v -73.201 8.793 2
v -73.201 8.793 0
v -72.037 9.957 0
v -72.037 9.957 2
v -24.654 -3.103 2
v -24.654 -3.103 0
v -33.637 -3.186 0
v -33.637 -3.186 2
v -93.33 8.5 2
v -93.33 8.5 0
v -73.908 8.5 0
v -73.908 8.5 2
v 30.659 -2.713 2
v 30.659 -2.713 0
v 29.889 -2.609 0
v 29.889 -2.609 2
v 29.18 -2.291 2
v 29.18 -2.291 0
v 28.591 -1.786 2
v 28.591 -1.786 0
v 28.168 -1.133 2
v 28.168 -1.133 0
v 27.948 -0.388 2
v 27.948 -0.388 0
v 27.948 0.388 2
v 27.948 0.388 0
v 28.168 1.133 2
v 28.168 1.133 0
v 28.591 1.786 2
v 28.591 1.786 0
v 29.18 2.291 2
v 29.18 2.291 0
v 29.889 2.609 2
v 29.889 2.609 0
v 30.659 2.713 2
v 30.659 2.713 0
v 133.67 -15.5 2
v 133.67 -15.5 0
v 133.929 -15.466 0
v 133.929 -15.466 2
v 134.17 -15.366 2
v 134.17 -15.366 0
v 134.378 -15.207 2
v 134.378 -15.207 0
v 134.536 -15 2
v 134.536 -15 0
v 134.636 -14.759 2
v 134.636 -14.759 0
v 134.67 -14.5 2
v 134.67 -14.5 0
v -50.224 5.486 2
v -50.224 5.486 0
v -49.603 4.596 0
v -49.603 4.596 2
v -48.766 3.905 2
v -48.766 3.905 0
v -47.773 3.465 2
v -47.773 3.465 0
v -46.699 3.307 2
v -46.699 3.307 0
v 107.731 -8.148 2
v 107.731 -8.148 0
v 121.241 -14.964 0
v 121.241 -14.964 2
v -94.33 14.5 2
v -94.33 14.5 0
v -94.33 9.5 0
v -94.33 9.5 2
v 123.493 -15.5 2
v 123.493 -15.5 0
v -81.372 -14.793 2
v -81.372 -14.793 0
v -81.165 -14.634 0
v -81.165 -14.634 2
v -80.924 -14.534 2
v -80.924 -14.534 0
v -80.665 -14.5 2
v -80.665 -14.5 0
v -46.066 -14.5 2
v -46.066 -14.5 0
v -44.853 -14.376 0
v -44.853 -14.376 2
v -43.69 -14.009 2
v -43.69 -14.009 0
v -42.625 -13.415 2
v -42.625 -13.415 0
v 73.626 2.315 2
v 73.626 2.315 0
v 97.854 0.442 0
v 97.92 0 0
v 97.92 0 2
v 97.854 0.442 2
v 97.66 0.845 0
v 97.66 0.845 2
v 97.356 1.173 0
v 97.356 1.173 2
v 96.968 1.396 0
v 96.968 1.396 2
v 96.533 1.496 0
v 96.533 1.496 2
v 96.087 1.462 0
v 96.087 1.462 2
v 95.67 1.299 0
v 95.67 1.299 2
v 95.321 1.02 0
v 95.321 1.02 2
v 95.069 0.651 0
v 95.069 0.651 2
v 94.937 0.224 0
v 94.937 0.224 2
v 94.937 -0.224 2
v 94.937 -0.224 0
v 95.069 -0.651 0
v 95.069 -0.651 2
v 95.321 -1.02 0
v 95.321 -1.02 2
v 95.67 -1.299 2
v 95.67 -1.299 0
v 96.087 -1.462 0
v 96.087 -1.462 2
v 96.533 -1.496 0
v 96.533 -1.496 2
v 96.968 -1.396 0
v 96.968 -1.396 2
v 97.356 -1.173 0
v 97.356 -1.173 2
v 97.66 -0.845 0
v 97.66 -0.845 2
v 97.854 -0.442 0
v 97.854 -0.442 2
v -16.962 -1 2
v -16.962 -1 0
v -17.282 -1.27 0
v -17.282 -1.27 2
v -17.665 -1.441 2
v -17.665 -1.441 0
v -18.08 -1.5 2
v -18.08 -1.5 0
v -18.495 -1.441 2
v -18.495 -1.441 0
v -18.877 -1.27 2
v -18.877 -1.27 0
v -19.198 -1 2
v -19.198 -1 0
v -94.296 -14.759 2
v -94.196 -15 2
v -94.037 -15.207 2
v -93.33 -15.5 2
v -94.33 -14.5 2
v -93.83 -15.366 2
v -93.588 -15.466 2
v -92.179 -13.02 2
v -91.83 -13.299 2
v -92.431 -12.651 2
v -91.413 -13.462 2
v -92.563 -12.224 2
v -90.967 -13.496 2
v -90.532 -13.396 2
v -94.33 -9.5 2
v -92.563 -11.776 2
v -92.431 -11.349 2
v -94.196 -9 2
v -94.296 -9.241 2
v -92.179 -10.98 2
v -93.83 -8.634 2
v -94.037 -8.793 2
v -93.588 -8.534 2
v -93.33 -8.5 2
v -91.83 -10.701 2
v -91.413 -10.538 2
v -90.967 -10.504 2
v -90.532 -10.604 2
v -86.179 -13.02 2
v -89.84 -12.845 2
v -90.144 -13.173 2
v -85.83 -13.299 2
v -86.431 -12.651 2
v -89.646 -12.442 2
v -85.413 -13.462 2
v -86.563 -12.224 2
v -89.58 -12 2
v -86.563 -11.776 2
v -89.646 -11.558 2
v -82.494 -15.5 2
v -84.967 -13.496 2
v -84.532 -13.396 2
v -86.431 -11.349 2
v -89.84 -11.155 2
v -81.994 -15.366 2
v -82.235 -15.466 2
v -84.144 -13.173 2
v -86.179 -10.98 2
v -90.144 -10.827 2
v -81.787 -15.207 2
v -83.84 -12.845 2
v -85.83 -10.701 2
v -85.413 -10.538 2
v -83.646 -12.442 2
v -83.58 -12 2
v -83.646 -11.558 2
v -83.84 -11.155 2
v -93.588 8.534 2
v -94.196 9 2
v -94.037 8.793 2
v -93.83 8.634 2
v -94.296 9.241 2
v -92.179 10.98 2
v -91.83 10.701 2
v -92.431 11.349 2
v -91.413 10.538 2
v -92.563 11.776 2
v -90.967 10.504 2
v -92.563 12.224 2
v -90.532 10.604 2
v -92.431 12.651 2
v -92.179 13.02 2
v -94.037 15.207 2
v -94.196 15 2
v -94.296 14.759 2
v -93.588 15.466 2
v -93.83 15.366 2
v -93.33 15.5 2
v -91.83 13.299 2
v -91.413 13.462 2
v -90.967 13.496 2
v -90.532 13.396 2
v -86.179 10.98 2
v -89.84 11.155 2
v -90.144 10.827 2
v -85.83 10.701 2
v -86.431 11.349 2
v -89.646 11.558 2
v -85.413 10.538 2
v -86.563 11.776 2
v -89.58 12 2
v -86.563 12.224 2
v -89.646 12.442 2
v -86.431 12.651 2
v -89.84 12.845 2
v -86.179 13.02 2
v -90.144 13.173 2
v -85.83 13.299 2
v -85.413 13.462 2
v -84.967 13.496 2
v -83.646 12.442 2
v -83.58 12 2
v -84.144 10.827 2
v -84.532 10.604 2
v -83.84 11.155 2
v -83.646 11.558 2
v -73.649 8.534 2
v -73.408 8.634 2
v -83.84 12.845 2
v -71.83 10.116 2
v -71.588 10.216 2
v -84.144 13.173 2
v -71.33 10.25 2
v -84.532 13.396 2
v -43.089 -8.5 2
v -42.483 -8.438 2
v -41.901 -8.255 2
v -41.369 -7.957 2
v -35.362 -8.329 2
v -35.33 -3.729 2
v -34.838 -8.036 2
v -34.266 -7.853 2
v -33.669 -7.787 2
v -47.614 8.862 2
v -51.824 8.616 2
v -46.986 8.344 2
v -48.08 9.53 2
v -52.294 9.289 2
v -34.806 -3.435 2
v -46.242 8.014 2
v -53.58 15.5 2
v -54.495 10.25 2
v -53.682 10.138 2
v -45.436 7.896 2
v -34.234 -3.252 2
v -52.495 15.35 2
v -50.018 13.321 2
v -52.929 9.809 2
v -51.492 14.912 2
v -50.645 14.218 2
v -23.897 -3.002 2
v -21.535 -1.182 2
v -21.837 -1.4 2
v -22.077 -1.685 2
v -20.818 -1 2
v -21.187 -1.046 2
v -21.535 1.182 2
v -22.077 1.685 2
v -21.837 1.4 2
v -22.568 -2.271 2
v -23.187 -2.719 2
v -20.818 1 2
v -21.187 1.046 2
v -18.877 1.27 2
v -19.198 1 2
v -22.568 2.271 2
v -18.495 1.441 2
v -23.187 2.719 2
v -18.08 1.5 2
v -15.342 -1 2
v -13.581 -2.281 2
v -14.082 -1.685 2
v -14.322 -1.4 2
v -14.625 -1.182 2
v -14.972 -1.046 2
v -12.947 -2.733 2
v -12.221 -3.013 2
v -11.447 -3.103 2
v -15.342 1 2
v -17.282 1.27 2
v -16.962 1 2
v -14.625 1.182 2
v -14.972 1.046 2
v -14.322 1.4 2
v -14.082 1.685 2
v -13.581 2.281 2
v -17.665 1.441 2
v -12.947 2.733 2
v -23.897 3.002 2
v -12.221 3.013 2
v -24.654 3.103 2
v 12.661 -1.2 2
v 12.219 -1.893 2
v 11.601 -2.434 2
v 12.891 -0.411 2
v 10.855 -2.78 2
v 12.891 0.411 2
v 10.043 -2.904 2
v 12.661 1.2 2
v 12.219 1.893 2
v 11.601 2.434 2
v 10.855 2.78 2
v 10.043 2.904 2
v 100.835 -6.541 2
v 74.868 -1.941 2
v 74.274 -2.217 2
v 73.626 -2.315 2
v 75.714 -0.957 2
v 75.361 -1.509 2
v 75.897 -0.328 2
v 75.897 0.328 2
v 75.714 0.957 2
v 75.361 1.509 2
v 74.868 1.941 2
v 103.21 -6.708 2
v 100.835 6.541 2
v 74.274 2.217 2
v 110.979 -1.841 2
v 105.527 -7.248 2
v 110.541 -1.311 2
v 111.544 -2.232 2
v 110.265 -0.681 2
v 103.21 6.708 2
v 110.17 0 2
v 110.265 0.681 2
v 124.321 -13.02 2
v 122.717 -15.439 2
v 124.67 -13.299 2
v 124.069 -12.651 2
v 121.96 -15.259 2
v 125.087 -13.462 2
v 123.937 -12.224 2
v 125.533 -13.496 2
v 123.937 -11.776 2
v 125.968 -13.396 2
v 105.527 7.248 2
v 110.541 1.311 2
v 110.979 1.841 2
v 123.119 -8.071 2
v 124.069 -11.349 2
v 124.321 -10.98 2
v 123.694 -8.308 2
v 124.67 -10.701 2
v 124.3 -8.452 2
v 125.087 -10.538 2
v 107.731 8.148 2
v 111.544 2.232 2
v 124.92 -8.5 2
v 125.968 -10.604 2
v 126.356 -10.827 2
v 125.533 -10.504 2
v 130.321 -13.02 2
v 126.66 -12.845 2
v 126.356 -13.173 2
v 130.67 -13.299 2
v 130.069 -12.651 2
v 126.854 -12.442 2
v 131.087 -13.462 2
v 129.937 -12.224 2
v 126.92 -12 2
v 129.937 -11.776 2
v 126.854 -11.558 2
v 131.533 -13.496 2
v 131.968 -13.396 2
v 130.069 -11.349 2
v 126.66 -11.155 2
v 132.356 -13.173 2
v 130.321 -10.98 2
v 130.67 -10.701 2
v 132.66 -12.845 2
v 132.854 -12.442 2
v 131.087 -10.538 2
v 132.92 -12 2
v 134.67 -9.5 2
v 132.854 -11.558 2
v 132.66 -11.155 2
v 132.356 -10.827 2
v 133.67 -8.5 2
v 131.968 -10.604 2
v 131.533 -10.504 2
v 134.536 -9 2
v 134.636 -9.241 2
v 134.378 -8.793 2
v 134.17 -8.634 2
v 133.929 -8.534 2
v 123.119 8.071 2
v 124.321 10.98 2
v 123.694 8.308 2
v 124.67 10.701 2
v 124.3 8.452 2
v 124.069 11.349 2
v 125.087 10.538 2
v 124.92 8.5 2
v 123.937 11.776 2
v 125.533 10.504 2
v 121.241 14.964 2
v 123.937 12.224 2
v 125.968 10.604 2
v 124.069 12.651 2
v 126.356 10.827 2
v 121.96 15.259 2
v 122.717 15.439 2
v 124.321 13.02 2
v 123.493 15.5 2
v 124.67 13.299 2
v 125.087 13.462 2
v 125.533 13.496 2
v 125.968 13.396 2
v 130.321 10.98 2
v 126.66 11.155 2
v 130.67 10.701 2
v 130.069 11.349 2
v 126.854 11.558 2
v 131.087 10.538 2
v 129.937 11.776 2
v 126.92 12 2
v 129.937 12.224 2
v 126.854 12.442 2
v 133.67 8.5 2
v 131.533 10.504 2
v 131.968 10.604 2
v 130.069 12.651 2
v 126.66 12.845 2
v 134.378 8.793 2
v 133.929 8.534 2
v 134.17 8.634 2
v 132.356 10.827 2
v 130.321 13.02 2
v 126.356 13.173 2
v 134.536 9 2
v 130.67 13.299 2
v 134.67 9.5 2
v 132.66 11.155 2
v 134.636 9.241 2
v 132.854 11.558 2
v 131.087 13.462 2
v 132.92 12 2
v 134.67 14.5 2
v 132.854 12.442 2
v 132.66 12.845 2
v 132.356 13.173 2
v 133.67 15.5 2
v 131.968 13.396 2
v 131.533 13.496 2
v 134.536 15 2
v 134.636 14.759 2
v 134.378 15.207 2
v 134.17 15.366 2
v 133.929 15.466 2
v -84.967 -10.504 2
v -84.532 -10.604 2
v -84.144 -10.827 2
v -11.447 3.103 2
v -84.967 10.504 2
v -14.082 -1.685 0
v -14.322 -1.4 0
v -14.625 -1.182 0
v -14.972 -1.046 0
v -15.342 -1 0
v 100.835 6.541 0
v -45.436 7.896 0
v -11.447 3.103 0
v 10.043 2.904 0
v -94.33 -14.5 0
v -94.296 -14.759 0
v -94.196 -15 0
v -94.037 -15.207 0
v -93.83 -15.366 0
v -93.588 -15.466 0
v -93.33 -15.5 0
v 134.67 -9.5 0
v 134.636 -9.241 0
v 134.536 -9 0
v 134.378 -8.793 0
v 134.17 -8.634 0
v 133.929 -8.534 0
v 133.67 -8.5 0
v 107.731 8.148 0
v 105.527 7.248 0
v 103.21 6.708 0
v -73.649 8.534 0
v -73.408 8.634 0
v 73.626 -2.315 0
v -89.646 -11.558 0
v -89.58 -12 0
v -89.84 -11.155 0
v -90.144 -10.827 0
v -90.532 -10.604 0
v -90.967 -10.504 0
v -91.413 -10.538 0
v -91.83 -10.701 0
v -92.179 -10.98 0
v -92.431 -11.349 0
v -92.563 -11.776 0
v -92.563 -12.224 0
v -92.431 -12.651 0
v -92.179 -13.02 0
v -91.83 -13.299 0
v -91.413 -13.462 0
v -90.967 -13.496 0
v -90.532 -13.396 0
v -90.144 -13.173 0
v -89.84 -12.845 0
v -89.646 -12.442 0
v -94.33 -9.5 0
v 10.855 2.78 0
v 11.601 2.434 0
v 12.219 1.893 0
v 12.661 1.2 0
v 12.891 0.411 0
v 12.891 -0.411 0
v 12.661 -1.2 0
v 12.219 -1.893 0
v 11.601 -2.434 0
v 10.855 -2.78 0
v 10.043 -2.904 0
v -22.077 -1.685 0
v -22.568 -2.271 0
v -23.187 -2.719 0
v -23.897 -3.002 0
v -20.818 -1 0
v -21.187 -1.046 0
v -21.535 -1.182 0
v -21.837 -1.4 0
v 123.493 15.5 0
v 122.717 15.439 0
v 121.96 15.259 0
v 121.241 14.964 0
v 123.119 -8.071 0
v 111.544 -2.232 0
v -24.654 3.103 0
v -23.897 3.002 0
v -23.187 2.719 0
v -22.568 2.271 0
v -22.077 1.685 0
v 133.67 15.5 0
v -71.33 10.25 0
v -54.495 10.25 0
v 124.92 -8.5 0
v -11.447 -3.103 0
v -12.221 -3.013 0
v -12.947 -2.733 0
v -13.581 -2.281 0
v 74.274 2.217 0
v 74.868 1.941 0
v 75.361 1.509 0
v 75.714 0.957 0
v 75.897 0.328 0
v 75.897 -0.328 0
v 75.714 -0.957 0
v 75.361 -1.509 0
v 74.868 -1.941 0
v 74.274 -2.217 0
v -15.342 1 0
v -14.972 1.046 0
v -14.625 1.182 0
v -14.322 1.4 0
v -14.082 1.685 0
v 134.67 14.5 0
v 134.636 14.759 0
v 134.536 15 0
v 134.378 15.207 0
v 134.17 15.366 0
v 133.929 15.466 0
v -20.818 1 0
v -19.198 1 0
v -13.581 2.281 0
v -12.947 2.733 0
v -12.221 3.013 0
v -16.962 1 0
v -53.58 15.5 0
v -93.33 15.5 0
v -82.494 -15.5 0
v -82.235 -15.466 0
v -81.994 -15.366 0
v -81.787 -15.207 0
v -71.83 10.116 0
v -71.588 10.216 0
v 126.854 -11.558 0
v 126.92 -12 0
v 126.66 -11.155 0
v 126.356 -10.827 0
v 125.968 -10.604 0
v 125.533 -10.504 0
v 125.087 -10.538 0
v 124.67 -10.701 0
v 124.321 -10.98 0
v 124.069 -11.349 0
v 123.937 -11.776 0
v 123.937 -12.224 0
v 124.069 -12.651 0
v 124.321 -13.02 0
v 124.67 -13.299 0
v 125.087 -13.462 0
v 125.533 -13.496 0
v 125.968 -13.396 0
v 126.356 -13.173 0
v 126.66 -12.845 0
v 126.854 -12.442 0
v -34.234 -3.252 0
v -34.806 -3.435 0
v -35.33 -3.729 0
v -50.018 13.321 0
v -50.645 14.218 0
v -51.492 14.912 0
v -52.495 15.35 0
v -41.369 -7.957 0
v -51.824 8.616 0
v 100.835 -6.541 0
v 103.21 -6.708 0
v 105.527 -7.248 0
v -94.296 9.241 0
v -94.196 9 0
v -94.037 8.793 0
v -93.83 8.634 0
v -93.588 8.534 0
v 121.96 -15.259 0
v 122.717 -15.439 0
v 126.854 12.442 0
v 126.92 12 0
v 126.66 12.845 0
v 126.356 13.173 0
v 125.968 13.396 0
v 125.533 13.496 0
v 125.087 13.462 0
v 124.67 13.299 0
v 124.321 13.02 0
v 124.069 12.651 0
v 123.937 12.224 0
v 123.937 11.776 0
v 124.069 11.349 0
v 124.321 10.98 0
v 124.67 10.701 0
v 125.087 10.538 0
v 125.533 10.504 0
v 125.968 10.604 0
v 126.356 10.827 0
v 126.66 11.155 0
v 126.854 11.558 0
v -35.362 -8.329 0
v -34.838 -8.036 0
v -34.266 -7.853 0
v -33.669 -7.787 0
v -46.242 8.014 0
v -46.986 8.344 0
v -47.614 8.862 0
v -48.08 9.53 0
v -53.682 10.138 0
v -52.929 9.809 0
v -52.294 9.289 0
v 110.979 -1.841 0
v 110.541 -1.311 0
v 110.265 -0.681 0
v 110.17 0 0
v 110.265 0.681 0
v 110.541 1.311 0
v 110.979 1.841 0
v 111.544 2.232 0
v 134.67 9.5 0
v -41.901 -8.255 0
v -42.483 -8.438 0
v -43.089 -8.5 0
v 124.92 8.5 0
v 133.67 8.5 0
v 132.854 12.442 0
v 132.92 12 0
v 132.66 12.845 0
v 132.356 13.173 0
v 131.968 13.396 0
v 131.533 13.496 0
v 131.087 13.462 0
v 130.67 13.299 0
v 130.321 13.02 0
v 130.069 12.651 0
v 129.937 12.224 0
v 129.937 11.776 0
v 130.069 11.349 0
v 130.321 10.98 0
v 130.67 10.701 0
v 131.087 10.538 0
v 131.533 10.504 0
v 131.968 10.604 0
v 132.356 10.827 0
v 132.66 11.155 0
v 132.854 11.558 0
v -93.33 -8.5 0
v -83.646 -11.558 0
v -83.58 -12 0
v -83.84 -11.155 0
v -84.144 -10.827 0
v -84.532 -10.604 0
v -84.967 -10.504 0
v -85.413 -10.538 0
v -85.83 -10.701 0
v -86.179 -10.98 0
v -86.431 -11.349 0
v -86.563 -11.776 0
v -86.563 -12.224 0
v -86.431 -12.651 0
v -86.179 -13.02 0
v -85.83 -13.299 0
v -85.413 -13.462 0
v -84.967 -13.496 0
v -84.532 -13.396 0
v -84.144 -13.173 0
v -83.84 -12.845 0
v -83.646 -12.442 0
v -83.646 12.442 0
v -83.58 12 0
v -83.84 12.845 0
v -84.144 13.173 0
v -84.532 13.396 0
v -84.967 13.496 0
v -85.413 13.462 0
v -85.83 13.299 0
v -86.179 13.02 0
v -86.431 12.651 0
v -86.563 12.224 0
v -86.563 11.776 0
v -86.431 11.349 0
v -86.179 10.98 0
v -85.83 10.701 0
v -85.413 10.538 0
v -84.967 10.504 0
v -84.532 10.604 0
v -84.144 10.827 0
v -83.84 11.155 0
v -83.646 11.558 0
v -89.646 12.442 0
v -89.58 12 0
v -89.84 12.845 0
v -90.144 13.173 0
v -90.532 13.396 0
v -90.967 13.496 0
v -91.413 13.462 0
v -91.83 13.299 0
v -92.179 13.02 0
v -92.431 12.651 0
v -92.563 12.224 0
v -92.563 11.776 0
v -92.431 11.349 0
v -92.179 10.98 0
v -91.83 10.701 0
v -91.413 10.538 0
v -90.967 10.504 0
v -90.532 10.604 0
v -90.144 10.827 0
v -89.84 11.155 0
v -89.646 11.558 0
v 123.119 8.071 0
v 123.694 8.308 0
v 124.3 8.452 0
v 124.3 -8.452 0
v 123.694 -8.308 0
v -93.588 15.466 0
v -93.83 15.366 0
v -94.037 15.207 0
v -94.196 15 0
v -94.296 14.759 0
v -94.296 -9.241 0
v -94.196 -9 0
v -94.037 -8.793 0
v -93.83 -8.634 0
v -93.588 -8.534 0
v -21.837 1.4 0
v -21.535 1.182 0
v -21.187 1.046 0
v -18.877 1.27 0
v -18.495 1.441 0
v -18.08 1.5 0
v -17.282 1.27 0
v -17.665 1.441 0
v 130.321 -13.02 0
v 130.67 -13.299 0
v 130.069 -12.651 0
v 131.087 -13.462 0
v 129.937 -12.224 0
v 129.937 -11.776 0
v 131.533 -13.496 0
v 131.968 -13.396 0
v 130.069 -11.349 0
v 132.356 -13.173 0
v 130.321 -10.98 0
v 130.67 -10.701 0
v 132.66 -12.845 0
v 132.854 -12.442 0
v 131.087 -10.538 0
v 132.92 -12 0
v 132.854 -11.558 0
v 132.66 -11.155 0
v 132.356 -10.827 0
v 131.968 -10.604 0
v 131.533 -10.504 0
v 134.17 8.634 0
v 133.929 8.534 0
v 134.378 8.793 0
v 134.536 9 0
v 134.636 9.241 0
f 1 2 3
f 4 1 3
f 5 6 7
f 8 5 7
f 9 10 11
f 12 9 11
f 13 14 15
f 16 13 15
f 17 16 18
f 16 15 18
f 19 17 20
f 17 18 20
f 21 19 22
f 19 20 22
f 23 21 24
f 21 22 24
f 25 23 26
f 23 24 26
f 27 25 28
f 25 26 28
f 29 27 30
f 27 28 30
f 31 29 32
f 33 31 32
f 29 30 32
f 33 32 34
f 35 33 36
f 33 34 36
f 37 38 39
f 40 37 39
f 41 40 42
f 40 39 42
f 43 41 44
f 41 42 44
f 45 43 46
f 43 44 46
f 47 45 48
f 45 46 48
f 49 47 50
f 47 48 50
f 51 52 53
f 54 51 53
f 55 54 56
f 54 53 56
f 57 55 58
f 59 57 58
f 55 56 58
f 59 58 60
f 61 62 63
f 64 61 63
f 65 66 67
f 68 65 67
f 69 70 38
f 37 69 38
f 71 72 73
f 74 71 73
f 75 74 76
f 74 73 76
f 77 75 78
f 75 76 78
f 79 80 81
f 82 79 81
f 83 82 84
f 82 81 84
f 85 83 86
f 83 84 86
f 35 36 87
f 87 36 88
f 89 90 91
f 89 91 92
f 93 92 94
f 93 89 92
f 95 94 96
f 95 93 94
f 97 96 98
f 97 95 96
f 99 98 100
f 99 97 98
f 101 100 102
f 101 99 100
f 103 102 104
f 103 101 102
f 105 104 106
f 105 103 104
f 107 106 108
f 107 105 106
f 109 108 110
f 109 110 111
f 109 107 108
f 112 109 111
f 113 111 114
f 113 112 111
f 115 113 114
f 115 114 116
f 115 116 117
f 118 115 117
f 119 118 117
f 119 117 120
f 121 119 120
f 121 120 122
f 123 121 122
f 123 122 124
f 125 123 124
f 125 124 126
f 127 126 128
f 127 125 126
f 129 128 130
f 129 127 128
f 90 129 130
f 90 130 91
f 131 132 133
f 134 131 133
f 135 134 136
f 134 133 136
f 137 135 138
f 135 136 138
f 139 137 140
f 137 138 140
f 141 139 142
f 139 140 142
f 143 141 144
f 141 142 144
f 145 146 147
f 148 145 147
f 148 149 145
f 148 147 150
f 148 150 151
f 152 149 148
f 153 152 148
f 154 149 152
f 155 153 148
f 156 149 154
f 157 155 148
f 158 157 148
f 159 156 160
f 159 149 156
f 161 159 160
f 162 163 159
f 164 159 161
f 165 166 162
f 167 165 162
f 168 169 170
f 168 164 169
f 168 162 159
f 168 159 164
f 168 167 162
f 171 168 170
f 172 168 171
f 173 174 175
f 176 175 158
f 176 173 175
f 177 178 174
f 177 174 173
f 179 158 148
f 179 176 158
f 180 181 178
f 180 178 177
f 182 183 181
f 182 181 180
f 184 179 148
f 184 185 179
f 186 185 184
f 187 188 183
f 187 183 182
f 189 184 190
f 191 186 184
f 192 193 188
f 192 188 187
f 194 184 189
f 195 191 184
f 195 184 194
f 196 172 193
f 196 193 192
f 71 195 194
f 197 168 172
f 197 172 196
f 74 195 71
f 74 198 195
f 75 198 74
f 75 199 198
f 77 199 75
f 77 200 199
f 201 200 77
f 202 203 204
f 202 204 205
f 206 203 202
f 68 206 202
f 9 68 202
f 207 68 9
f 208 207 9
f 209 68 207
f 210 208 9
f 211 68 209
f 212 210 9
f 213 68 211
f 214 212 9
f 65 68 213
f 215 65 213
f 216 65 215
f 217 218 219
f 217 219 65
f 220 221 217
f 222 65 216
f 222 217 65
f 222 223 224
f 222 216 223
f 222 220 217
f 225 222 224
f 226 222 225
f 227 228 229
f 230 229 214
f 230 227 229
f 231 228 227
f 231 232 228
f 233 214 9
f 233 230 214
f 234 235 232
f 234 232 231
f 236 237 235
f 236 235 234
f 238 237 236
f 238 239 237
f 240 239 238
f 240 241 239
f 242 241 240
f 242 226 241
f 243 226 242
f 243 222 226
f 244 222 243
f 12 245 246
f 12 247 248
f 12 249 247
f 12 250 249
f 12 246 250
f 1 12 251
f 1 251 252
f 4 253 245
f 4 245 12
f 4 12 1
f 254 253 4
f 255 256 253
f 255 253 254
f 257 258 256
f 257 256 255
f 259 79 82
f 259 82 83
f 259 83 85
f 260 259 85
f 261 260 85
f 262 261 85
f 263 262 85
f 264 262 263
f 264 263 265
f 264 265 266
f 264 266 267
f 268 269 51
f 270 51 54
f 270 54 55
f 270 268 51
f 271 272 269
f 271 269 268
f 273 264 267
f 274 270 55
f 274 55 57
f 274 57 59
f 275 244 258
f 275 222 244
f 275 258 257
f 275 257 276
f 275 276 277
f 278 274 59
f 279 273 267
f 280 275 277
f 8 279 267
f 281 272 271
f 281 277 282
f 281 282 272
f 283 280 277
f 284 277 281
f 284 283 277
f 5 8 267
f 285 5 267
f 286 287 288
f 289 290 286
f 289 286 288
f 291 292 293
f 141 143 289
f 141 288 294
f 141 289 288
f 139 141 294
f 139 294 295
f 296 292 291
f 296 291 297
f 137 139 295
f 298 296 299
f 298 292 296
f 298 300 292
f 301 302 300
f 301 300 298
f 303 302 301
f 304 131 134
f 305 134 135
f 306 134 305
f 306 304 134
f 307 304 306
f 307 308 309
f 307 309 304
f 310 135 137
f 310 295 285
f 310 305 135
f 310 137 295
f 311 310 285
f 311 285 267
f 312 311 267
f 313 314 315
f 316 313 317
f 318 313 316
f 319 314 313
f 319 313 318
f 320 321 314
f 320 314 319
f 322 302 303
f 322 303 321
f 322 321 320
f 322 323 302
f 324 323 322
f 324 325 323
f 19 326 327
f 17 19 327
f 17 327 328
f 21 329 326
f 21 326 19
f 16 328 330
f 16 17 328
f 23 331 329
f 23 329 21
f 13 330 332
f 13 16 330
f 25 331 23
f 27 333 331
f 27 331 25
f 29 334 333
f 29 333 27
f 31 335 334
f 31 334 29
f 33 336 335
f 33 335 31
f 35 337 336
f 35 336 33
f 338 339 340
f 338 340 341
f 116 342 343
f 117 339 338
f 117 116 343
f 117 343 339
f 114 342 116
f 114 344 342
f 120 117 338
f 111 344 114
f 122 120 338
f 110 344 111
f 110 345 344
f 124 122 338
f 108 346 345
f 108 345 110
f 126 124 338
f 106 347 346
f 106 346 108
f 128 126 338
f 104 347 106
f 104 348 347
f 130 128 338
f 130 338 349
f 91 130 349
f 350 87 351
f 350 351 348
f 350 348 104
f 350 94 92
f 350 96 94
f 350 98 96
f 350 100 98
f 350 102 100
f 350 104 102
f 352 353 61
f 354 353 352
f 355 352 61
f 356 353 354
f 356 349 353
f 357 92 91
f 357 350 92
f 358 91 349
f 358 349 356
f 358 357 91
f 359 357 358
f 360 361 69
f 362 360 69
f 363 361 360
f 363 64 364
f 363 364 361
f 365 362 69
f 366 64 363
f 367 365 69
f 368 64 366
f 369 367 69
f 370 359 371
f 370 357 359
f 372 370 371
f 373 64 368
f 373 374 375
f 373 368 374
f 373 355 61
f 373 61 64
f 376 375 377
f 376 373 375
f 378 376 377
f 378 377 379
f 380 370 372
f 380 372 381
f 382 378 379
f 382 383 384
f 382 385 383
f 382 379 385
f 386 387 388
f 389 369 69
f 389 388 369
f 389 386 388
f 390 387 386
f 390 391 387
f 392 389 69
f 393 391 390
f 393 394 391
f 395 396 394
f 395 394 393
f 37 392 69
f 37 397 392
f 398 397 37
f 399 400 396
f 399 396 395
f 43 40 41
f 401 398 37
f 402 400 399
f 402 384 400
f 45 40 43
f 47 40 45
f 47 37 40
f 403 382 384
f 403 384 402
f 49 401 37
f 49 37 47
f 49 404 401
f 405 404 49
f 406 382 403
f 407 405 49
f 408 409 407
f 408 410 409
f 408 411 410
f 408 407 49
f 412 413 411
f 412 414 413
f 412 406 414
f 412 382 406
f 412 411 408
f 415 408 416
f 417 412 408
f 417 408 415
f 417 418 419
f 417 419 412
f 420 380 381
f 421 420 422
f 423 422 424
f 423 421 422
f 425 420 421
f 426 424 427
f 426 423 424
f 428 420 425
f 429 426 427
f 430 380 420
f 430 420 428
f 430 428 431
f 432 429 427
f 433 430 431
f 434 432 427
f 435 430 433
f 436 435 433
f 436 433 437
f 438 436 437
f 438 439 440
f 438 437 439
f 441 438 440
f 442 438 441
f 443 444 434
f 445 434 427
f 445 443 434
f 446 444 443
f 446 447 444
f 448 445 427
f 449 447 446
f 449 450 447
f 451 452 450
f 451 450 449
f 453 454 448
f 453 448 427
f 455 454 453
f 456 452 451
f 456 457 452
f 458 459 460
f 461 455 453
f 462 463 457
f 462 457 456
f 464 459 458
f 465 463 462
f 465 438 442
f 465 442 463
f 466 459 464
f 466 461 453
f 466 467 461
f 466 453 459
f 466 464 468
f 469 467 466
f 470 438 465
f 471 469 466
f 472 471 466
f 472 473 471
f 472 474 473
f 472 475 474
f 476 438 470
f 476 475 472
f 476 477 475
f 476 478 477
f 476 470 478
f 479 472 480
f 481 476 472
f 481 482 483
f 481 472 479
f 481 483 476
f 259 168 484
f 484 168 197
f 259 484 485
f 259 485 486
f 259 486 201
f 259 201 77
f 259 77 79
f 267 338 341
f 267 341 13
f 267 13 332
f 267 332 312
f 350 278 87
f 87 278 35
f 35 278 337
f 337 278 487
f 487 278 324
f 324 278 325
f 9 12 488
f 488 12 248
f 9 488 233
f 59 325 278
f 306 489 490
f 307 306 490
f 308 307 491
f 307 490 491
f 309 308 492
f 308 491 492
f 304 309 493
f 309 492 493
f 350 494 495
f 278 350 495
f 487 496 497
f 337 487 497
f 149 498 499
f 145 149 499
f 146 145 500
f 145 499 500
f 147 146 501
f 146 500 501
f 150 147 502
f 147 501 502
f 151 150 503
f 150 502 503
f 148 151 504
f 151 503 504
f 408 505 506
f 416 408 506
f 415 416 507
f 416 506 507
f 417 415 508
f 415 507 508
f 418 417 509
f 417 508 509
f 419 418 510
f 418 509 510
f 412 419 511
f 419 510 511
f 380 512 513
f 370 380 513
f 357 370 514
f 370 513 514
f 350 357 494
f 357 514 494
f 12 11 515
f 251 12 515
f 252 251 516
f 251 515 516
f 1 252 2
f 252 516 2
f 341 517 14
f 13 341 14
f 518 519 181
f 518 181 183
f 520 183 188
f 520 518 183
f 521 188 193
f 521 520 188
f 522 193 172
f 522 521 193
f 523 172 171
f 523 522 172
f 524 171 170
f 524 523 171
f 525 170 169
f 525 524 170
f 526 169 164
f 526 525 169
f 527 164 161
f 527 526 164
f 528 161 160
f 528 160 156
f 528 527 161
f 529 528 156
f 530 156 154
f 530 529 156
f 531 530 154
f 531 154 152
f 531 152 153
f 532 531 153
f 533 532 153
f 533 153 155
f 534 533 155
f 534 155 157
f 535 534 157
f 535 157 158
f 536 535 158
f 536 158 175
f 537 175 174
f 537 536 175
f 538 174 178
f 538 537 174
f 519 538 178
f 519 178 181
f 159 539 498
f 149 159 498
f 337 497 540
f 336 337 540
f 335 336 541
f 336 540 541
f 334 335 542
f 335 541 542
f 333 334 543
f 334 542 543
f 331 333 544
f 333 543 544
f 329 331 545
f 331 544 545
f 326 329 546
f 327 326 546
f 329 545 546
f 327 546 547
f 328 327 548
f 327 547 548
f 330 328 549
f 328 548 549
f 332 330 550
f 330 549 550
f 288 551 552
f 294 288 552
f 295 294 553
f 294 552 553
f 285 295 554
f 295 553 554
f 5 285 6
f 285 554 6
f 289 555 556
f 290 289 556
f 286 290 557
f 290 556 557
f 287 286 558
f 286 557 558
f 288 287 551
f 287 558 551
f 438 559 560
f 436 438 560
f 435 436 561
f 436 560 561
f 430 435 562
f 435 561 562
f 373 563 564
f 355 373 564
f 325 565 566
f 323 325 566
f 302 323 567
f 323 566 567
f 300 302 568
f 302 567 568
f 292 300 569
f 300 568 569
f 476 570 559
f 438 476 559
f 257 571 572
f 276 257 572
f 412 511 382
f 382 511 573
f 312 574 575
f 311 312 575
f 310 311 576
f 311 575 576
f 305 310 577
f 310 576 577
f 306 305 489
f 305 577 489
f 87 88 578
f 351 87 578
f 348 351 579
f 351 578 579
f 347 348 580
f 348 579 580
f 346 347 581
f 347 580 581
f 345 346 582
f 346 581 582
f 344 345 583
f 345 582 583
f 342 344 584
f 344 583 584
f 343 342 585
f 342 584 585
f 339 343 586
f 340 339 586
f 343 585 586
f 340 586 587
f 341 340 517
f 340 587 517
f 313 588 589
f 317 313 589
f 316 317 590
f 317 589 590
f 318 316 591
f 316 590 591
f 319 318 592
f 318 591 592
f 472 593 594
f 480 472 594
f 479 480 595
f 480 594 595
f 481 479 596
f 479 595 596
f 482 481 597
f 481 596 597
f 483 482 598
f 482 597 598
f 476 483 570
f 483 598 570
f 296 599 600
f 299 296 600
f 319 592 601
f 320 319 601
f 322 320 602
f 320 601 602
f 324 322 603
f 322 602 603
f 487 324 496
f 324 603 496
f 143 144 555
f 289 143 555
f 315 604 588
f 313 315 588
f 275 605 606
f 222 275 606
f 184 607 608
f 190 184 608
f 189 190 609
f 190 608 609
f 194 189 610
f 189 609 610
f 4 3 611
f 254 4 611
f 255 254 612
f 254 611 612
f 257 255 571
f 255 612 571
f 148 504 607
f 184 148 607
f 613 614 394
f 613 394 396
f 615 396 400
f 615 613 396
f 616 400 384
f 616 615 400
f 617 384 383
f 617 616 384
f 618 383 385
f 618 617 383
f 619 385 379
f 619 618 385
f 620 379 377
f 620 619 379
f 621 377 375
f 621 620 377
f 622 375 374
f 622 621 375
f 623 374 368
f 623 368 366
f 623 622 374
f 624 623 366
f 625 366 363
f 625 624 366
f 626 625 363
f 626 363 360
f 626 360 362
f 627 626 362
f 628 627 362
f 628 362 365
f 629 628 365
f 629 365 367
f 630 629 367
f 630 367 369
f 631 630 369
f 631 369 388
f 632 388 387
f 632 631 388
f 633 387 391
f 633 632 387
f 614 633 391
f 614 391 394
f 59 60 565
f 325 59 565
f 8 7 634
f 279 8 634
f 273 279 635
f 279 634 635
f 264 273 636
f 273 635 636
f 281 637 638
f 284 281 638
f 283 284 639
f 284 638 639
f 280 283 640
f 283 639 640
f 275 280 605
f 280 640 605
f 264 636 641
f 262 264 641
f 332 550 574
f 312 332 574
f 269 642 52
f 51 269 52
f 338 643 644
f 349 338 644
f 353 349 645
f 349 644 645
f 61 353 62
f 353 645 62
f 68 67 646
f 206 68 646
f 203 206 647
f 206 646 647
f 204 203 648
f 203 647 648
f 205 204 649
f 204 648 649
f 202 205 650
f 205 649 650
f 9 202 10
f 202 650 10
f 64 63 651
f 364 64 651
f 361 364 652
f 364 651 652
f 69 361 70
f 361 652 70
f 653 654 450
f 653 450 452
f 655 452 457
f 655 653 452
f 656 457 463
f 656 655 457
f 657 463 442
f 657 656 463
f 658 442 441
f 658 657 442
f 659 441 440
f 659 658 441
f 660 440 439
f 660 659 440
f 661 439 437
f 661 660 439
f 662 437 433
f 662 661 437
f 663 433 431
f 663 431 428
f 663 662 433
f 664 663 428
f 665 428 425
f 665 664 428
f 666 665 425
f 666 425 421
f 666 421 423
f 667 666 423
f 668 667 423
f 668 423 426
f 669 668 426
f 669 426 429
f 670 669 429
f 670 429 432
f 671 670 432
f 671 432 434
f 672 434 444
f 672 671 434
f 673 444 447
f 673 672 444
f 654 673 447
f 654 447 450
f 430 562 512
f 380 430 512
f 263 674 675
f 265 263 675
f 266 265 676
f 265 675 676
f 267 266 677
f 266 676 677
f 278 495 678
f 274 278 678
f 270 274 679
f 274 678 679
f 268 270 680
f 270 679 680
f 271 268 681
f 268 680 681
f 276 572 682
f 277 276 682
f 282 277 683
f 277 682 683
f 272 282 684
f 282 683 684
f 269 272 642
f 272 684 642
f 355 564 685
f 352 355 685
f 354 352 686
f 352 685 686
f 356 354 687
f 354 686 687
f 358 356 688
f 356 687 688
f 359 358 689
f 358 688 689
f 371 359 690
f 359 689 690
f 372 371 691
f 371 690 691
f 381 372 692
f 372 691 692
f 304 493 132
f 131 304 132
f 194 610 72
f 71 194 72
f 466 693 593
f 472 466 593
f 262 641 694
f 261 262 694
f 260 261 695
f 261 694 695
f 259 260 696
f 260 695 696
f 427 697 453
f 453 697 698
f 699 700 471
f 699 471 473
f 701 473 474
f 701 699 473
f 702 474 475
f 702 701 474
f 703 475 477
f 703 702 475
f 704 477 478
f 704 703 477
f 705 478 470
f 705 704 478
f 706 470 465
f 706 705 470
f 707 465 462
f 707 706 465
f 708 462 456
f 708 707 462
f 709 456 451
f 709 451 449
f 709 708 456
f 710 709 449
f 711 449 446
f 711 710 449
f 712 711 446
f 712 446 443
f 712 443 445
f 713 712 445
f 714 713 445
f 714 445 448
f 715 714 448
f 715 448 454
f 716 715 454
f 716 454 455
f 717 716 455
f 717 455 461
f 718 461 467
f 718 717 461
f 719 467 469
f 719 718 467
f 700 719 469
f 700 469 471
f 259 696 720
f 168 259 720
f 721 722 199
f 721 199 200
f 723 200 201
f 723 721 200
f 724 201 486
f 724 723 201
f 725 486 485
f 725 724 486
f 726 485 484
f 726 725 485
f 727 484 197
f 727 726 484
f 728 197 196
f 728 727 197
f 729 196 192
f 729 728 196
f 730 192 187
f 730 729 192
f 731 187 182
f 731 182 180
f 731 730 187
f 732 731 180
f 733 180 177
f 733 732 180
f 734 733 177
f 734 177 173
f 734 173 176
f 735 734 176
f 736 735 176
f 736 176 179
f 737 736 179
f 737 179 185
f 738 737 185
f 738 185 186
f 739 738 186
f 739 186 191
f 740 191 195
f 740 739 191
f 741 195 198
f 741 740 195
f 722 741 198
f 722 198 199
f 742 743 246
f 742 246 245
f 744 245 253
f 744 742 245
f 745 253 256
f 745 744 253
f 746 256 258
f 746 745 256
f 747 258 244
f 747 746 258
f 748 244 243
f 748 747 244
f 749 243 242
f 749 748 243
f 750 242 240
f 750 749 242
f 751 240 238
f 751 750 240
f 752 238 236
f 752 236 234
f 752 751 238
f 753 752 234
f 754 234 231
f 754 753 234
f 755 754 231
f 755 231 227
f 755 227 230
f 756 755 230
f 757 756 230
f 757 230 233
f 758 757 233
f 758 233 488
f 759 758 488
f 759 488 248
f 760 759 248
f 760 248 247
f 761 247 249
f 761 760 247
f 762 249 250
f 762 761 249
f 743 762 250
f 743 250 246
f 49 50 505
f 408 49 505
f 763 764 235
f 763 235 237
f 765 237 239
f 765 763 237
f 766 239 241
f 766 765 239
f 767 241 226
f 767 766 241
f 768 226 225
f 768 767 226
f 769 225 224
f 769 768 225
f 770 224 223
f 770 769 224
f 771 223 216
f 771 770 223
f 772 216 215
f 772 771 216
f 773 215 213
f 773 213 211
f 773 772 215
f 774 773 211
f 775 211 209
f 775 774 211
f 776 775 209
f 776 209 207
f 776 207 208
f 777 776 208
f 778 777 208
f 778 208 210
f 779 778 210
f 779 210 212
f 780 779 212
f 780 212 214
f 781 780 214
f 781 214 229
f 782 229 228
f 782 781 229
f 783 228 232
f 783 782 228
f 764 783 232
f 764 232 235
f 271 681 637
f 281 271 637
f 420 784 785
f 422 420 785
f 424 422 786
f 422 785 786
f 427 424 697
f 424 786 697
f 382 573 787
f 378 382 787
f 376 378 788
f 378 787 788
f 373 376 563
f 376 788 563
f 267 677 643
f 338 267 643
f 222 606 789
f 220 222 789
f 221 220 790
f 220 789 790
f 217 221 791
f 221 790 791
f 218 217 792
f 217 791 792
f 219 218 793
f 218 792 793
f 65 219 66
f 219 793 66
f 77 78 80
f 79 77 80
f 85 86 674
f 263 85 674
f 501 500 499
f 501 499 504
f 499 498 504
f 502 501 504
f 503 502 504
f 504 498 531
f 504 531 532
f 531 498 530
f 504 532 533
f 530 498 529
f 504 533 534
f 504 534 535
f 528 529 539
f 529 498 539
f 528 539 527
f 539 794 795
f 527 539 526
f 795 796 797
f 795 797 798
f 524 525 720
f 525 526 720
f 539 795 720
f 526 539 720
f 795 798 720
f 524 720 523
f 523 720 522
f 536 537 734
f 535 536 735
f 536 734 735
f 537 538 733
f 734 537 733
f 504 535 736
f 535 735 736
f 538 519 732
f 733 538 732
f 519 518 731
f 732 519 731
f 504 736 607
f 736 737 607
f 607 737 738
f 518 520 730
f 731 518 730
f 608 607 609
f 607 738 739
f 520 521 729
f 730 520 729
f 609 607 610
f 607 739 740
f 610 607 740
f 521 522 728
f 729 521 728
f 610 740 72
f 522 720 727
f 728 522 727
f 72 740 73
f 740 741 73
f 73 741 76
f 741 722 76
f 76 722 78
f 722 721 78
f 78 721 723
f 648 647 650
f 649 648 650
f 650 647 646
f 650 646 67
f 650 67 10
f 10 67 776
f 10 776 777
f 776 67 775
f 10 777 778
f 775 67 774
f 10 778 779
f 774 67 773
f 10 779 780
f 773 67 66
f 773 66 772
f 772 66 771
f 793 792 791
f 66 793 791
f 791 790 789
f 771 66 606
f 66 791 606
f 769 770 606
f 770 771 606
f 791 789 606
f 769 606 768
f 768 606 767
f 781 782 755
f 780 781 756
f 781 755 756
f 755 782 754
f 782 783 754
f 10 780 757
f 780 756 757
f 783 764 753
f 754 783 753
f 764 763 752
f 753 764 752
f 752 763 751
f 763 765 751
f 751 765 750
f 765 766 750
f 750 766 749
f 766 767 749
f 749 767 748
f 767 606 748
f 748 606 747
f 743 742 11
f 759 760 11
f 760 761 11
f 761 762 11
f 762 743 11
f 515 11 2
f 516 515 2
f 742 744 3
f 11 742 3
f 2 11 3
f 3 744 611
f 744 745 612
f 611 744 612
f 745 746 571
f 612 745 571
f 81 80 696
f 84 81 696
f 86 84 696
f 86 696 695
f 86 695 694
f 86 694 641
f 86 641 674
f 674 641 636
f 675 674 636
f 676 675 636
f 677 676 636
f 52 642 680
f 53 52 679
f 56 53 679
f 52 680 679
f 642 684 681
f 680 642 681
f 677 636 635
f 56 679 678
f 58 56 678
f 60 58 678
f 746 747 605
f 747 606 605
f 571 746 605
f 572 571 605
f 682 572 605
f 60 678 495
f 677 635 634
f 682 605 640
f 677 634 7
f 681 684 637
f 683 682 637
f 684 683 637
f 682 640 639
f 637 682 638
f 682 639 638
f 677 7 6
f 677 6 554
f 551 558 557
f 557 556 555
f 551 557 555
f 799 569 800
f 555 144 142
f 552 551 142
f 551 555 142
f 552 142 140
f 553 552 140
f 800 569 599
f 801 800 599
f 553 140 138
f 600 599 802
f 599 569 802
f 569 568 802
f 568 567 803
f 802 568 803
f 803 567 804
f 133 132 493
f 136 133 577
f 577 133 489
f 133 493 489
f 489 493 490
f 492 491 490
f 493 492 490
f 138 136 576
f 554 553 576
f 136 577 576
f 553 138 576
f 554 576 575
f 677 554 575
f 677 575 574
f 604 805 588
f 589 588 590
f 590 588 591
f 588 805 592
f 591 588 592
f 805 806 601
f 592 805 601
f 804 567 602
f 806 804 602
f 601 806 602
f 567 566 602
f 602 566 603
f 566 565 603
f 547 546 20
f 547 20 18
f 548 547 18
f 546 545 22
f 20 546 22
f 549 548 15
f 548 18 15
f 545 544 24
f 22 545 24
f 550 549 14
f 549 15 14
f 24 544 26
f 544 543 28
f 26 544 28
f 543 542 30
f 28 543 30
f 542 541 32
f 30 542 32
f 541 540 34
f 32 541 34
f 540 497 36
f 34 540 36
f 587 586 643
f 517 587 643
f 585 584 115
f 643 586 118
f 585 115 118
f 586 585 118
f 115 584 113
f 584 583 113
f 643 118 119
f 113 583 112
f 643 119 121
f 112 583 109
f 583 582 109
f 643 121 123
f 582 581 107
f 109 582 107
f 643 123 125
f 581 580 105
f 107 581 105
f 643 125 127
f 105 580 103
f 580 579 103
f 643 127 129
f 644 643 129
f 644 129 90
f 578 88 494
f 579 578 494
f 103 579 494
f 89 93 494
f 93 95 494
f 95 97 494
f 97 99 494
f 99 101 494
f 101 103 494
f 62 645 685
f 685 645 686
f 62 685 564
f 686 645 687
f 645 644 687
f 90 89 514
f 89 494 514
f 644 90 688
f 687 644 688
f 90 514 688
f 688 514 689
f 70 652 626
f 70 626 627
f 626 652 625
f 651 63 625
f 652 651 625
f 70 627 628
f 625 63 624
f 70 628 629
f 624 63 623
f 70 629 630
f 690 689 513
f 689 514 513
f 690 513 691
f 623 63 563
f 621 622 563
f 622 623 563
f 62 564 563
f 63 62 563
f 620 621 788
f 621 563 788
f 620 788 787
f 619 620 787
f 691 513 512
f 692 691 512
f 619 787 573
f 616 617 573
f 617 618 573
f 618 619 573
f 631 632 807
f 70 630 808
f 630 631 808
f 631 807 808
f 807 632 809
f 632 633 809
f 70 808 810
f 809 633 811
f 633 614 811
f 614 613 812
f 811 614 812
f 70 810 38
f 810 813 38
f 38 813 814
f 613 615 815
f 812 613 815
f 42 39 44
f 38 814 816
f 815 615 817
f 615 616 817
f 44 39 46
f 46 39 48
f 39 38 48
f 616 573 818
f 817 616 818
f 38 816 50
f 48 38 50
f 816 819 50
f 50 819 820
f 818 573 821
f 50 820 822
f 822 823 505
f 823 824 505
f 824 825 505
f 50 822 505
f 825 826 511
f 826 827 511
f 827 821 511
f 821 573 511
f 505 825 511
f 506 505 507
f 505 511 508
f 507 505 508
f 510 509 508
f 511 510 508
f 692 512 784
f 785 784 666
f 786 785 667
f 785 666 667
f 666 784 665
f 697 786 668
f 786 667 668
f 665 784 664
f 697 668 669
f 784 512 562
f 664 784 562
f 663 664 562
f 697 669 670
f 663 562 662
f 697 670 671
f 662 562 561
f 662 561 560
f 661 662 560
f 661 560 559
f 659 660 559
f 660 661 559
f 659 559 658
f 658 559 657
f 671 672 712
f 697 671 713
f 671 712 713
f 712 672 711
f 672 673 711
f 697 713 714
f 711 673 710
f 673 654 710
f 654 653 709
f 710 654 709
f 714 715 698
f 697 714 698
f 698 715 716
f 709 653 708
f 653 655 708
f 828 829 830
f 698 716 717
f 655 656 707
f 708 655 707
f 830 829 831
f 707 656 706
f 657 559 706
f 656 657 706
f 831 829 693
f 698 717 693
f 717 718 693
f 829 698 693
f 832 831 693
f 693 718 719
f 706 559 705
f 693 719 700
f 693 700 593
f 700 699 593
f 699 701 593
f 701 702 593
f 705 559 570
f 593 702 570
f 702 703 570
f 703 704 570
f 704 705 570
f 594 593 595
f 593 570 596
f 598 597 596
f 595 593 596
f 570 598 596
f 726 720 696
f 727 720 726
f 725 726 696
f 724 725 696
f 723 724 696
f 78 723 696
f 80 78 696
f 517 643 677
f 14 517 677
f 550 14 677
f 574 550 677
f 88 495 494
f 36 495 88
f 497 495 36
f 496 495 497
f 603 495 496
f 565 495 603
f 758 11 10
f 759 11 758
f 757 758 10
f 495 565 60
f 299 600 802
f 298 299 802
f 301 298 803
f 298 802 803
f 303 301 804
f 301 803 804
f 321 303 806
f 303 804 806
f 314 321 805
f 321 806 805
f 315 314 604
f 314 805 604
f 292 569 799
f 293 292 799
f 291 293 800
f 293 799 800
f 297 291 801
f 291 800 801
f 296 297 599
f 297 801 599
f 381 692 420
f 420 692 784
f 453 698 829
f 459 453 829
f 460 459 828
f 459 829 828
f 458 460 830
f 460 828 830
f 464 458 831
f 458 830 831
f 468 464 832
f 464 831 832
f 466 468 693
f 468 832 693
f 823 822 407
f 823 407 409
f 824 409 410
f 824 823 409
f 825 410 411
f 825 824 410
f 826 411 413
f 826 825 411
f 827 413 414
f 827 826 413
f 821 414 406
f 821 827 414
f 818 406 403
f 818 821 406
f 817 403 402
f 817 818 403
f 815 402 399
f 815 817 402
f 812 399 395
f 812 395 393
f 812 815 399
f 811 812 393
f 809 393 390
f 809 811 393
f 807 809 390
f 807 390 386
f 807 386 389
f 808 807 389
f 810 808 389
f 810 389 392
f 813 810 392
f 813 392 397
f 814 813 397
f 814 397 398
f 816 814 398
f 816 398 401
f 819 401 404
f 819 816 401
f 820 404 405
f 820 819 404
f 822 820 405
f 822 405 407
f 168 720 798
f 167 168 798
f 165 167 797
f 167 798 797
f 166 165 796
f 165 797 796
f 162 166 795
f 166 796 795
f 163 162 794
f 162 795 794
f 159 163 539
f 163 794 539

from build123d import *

# Parameters (mm, degrees)
F0_R     = 1.5
F1_DEPTH = 2


with BuildPart() as f1:
    # F0 (on Top) → F1 (new body)
    with BuildSketch(Plane.XY):
        with BuildLine():
            ThreePointArc((-19.197627, 1), (-18.079593, 1.5), (-16.961559, 1))
            Line((-16.961559, 1), (-15.341597, 1))
            ThreePointArc((-15.341597, 1), (-14.624629, 1.182443), (-14.082068, 1.685392))
            ThreePointArc((-14.082068, 1.685392), (-12.946894, 2.732812), (-11.447412, 3.103307))
            Line((-11.447412, 3.103307), (10.042908, 2.904272))
            ThreePointArc((10.042908, 2.904272), (12.920407, 0), (10.042908, -2.904272))
            Line((10.042908, -2.904272), (-11.447412, -3.103307))
            ThreePointArc((-11.447412, -3.103307), (-12.946894, -2.732812), (-14.082068, -1.685392))
            ThreePointArc((-14.082068, -1.685392), (-14.624629, -1.182443), (-15.341597, -1))
            Line((-15.341597, -1), (-16.961559, -1))
            ThreePointArc((-16.961559, -1), (-18.079593, -1.5), (-19.197627, -1))
            Line((-19.197627, -1), (-20.817589, -1))
            ThreePointArc((-20.817589, -1), (-21.534557, -1.182443), (-22.077118, -1.685392))
            ThreePointArc((-22.077118, -1.685392), (-23.187047, -2.719074), (-24.654291, -3.103307))
            Line((-24.654291, -3.103307), (-33.636647, -3.186497))
            ThreePointArc((-33.636647, -3.186497), (-34.524221, -3.329426), (-35.329593, -3.728912))
            Line((-35.329593, -3.728912), (-41.368579, -7.957456))
            ThreePointArc((-41.368579, -7.957456), (-42.187191, -8.361151), (-43.089309, -8.5))
            Line((-43.089309, -8.5), (-93.329593, -8.5))
            ThreePointArc((-93.329593, -8.5), (-94.0367, -8.792893), (-94.329593, -9.5))
            Line((-94.329593, -9.5), (-94.329593, -14.5))
            ThreePointArc((-94.329593, -14.5), (-94.0367, -15.207107), (-93.329593, -15.5))
            Line((-93.329593, -15.5), (-82.493807, -15.5))
            ThreePointArc((-82.493807, -15.5), (-82.111123, -15.42388), (-81.7867, -15.207107))
            Line((-81.7867, -15.207107), (-81.372486, -14.792893))
            ThreePointArc((-81.372486, -14.792893), (-81.048063, -14.57612), (-80.66538, -14.5))
            Line((-80.66538, -14.5), (-46.066168, -14.5))
            ThreePointArc((-46.066168, -14.5), (-44.261933, -14.222302), (-42.624709, -13.414912))
            Line((-42.624709, -13.414912), (-35.361857, -8.329409))
            ThreePointArc((-35.361857, -8.329409), (-34.556484, -7.929922), (-33.668911, -7.786993))
            Line((-33.668911, -7.786993), (100.835377, -6.541272))
            ThreePointArc((100.835377, -6.541272), (104.379181, -6.932181), (107.730626, -8.148393))
            Line((107.730626, -8.148393), (121.240512, -14.964079))
            ThreePointArc((121.240512, -14.964079), (122.335124, -15.364175), (123.492622, -15.5))
            Line((123.492622, -15.5), (133.670407, -15.5))
            ThreePointArc((133.670407, -15.5), (134.377514, -15.207107), (134.670407, -14.5))
            Line((134.670407, -14.5), (134.670407, -9.5))
            ThreePointArc((134.670407, -9.5), (134.377514, -8.792893), (133.670407, -8.5))
            Line((133.670407, -8.5), (124.920407, -8.5))
            ThreePointArc((124.920407, -8.5), (123.994408, -8.39134), (123.118718, -8.071263))
            Line((123.118718, -8.071263), (111.544352, -2.232039))
            ThreePointArc((111.544352, -2.232039), (110.170407, 0), (111.544352, 2.232039))
            Line((111.544352, 2.232039), (123.118718, 8.071263))
            ThreePointArc((123.118718, 8.071263), (123.994408, 8.39134), (124.920407, 8.5))
            Line((124.920407, 8.5), (133.670407, 8.5))
            ThreePointArc((133.670407, 8.5), (134.377514, 8.792893), (134.670407, 9.5))
            Line((134.670407, 9.5), (134.670407, 14.5))
            ThreePointArc((134.670407, 14.5), (134.377514, 15.207107), (133.670407, 15.5))
            Line((133.670407, 15.5), (123.492622, 15.5))
            ThreePointArc((123.492622, 15.5), (122.335124, 15.364175), (121.240512, 14.964079))
            Line((121.240512, 14.964079), (107.730626, 8.148393))
            ThreePointArc((107.730626, 8.148393), (104.379181, 6.932181), (100.835377, 6.541272))
            Line((100.835377, 6.541272), (-45.436336, 7.895978))
            ThreePointArc((-45.436336, 7.895978), (-46.986025, 8.34407), (-48.079593, 9.530001))
            Line((-48.079593, 9.530001), (-50.018206, 13.321132))
            ThreePointArc((-50.018206, 13.321132), (-51.492074, 14.912076), (-53.579593, 15.5))
            Line((-53.579593, 15.5), (-93.329593, 15.5))
            ThreePointArc((-93.329593, 15.5), (-94.0367, 15.207107), (-94.329593, 14.5))
            Line((-94.329593, 14.5), (-94.329593, 9.5))
            ThreePointArc((-94.329593, 9.5), (-94.0367, 8.792893), (-93.329593, 8.5))
            Line((-93.329593, 8.5), (-73.90802, 8.5))
            ThreePointArc((-73.90802, 8.5), (-73.525337, 8.57612), (-73.200914, 8.792893))
            Line((-73.200914, 8.792893), (-72.0367, 9.957107))
            ThreePointArc((-72.0367, 9.957107), (-71.712277, 10.17388), (-71.329593, 10.25))
            Line((-71.329593, 10.25), (-54.49502, 10.25))
            ThreePointArc((-54.49502, 10.25), (-52.929381, 9.809057), (-51.82398, 8.615849))
            Line((-51.82398, 8.615849), (-50.223606, 5.486174))
            ThreePointArc((-50.223606, 5.486174), (-48.765515, 3.904933), (-46.699263, 3.307478))
            Line((-46.699263, 3.307478), (-24.654291, 3.103307))
            ThreePointArc((-24.654291, 3.103307), (-23.187047, 2.719074), (-22.077118, 1.685392))
            ThreePointArc((-22.077118, 1.685392), (-21.534557, 1.182443), (-20.817589, 1))
            Line((-20.817589, 1), (-19.197627, 1))
        make_face()
        with Locations((-91.079593, -12)):
            Circle(F0_R, mode=Mode.SUBTRACT)
        with Locations((-85.079593, -12)):
            Circle(F0_R, mode=Mode.SUBTRACT)
        with Locations((125.420407, -12)):
            Circle(F0_R, mode=Mode.SUBTRACT)
        with Locations((131.420407, -12)):
            Circle(F0_R, mode=Mode.SUBTRACT)
        with BuildLine():
            ThreePointArc((73.626358, 2.315394), (75.920407, 0), (73.626358, -2.315394))
            Line((73.626358, -2.315394), (30.658988, -2.713339))
            ThreePointArc((30.658988, -2.713339), (27.920407, 2e-06), (30.658992, 2.713339))
            Line((30.658992, 2.713339), (73.626358, 2.315394))
        make_face(mode=Mode.SUBTRACT)
        with Locations((-91.079593, 12)):
            Circle(F0_R, mode=Mode.SUBTRACT)
        with Locations((-85.079593, 12)):
            Circle(F0_R, mode=Mode.SUBTRACT)
        with Locations((96.420407, 0)):
            Circle(F0_R, mode=Mode.SUBTRACT)
        with Locations((125.420407, 12)):
            Circle(F0_R, mode=Mode.SUBTRACT)
        with Locations((131.420407, 12)):
            Circle(F0_R, mode=Mode.SUBTRACT)
    extrude(amount=F1_DEPTH)


solid = f1.part
